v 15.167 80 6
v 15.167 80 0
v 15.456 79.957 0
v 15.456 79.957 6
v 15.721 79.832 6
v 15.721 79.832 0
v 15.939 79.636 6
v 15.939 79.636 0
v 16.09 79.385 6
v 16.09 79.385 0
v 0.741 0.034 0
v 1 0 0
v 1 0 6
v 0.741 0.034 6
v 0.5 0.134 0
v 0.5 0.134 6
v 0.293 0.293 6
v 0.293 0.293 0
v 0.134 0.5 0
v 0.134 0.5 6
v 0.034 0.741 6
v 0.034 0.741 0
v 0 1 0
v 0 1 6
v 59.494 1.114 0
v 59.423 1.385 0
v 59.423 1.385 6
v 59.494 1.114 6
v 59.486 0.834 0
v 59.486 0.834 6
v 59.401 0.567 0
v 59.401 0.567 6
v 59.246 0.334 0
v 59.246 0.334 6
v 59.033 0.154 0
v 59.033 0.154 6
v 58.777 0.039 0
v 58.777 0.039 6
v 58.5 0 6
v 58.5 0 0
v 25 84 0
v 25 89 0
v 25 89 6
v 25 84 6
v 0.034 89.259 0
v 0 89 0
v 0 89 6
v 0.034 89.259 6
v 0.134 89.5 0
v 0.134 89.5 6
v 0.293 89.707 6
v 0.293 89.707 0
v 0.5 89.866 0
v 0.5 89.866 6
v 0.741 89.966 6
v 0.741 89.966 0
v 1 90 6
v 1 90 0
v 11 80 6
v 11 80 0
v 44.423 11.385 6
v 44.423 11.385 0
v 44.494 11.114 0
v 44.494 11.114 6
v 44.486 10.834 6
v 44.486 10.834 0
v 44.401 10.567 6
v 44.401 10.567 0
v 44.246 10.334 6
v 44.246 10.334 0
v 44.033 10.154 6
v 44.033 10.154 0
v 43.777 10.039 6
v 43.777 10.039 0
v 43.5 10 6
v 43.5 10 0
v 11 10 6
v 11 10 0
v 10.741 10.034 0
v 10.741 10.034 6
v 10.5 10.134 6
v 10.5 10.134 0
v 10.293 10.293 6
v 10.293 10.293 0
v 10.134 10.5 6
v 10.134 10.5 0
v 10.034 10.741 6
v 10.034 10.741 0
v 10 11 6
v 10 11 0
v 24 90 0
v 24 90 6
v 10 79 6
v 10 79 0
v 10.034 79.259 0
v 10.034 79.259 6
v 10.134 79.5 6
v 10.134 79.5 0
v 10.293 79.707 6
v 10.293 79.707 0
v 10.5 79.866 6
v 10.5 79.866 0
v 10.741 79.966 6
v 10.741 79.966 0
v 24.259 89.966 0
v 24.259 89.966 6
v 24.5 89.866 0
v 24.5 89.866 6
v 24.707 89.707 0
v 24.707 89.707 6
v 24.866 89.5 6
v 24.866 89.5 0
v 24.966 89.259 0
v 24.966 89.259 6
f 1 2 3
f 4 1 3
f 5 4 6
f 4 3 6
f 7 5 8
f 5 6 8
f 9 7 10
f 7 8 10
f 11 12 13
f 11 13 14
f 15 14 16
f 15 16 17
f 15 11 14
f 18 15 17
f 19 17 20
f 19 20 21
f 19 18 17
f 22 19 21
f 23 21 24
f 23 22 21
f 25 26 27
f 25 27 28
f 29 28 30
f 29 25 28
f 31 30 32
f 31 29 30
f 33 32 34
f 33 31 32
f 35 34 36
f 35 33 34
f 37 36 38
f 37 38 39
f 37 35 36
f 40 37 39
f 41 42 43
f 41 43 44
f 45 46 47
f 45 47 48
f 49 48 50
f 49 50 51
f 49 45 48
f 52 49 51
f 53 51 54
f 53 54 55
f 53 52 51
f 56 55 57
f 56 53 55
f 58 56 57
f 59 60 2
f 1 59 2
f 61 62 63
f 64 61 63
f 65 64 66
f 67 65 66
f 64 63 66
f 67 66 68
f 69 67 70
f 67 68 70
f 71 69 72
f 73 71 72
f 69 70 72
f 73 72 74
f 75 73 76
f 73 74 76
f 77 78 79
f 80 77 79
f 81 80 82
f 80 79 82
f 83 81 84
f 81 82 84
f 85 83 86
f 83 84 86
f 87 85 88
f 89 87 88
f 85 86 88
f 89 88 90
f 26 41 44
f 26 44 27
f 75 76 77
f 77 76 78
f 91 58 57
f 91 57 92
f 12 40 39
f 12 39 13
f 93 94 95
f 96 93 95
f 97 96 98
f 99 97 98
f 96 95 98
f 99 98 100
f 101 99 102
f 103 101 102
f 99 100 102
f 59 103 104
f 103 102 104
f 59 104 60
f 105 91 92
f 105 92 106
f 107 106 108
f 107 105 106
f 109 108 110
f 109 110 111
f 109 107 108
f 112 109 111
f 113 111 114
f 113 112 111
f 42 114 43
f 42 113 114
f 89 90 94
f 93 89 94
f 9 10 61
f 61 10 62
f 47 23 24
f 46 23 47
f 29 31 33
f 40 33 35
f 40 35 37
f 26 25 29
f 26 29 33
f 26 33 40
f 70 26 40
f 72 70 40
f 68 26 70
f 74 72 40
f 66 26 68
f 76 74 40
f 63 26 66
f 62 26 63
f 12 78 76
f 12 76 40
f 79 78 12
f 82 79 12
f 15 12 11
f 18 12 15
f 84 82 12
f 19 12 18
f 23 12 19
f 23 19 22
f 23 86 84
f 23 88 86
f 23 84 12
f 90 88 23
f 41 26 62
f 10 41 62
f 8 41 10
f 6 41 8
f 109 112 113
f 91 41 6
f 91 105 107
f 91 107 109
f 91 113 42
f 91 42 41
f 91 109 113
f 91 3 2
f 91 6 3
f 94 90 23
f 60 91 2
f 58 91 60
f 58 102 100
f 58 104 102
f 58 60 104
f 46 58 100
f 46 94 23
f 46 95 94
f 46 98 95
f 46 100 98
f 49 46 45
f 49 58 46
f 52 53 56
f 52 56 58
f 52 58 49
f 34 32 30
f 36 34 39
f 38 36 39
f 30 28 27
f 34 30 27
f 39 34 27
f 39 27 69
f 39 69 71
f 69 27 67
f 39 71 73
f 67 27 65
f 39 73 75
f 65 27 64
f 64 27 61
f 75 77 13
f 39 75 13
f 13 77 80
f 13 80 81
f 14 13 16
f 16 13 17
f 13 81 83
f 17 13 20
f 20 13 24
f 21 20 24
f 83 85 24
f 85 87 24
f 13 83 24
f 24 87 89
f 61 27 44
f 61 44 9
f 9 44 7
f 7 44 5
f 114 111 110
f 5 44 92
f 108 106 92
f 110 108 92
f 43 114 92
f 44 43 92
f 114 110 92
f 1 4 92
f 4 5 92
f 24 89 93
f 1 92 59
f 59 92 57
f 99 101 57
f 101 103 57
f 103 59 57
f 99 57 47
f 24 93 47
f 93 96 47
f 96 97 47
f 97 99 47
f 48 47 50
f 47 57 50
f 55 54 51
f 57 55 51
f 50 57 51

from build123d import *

# Parameters (mm, degrees)
BOSS_EXTRU_1_DEPTH = 6


with BuildPart() as part:
    # Esquisse1 → Boss.-Extru.1 (new body)
    with BuildSketch(Plane.XY):
        with BuildLine():
            Line((0, 1), (0, 89))
            ThreePointArc((0, 89), (0.292893219, 89.707106781), (1, 90))
            Line((1, 90), (24, 90))
            ThreePointArc((24, 90), (24.707106781, 89.707106781), (25, 89))
            Line((25, 89), (25, 84))
            Line((25, 84), (59.423076923, 1.384615385))
            ThreePointArc((59.423076923, 1.384615385), (59.332050294, 0.445299804), (58.5, 0))
            Line((58.5, 0), (1, 0))
            ThreePointArc((1, 0), (0.292893219, 0.292893219), (0, 1))
        make_face()
        with BuildLine():
            Line((10, 11), (10, 79))
            ThreePointArc((10, 79), (10.292893219, 79.707106781), (11, 80))
            Line((11, 80), (15.166666667, 80))
            ThreePointArc((15.166666667, 80), (15.721366863, 79.832050294), (16.08974359, 79.384615385))
            Line((16.08974359, 79.384615385), (44.423076923, 11.384615385))
            ThreePointArc((44.423076923, 11.384615385), (44.332050294, 10.445299804), (43.5, 10))
            Line((43.5, 10), (11, 10))
            ThreePointArc((11, 10), (10.292893219, 10.292893219), (10, 11))
        make_face(mode=Mode.SUBTRACT)
    extrude(amount=BOSS_EXTRU_1_DEPTH)


solid = part.part
